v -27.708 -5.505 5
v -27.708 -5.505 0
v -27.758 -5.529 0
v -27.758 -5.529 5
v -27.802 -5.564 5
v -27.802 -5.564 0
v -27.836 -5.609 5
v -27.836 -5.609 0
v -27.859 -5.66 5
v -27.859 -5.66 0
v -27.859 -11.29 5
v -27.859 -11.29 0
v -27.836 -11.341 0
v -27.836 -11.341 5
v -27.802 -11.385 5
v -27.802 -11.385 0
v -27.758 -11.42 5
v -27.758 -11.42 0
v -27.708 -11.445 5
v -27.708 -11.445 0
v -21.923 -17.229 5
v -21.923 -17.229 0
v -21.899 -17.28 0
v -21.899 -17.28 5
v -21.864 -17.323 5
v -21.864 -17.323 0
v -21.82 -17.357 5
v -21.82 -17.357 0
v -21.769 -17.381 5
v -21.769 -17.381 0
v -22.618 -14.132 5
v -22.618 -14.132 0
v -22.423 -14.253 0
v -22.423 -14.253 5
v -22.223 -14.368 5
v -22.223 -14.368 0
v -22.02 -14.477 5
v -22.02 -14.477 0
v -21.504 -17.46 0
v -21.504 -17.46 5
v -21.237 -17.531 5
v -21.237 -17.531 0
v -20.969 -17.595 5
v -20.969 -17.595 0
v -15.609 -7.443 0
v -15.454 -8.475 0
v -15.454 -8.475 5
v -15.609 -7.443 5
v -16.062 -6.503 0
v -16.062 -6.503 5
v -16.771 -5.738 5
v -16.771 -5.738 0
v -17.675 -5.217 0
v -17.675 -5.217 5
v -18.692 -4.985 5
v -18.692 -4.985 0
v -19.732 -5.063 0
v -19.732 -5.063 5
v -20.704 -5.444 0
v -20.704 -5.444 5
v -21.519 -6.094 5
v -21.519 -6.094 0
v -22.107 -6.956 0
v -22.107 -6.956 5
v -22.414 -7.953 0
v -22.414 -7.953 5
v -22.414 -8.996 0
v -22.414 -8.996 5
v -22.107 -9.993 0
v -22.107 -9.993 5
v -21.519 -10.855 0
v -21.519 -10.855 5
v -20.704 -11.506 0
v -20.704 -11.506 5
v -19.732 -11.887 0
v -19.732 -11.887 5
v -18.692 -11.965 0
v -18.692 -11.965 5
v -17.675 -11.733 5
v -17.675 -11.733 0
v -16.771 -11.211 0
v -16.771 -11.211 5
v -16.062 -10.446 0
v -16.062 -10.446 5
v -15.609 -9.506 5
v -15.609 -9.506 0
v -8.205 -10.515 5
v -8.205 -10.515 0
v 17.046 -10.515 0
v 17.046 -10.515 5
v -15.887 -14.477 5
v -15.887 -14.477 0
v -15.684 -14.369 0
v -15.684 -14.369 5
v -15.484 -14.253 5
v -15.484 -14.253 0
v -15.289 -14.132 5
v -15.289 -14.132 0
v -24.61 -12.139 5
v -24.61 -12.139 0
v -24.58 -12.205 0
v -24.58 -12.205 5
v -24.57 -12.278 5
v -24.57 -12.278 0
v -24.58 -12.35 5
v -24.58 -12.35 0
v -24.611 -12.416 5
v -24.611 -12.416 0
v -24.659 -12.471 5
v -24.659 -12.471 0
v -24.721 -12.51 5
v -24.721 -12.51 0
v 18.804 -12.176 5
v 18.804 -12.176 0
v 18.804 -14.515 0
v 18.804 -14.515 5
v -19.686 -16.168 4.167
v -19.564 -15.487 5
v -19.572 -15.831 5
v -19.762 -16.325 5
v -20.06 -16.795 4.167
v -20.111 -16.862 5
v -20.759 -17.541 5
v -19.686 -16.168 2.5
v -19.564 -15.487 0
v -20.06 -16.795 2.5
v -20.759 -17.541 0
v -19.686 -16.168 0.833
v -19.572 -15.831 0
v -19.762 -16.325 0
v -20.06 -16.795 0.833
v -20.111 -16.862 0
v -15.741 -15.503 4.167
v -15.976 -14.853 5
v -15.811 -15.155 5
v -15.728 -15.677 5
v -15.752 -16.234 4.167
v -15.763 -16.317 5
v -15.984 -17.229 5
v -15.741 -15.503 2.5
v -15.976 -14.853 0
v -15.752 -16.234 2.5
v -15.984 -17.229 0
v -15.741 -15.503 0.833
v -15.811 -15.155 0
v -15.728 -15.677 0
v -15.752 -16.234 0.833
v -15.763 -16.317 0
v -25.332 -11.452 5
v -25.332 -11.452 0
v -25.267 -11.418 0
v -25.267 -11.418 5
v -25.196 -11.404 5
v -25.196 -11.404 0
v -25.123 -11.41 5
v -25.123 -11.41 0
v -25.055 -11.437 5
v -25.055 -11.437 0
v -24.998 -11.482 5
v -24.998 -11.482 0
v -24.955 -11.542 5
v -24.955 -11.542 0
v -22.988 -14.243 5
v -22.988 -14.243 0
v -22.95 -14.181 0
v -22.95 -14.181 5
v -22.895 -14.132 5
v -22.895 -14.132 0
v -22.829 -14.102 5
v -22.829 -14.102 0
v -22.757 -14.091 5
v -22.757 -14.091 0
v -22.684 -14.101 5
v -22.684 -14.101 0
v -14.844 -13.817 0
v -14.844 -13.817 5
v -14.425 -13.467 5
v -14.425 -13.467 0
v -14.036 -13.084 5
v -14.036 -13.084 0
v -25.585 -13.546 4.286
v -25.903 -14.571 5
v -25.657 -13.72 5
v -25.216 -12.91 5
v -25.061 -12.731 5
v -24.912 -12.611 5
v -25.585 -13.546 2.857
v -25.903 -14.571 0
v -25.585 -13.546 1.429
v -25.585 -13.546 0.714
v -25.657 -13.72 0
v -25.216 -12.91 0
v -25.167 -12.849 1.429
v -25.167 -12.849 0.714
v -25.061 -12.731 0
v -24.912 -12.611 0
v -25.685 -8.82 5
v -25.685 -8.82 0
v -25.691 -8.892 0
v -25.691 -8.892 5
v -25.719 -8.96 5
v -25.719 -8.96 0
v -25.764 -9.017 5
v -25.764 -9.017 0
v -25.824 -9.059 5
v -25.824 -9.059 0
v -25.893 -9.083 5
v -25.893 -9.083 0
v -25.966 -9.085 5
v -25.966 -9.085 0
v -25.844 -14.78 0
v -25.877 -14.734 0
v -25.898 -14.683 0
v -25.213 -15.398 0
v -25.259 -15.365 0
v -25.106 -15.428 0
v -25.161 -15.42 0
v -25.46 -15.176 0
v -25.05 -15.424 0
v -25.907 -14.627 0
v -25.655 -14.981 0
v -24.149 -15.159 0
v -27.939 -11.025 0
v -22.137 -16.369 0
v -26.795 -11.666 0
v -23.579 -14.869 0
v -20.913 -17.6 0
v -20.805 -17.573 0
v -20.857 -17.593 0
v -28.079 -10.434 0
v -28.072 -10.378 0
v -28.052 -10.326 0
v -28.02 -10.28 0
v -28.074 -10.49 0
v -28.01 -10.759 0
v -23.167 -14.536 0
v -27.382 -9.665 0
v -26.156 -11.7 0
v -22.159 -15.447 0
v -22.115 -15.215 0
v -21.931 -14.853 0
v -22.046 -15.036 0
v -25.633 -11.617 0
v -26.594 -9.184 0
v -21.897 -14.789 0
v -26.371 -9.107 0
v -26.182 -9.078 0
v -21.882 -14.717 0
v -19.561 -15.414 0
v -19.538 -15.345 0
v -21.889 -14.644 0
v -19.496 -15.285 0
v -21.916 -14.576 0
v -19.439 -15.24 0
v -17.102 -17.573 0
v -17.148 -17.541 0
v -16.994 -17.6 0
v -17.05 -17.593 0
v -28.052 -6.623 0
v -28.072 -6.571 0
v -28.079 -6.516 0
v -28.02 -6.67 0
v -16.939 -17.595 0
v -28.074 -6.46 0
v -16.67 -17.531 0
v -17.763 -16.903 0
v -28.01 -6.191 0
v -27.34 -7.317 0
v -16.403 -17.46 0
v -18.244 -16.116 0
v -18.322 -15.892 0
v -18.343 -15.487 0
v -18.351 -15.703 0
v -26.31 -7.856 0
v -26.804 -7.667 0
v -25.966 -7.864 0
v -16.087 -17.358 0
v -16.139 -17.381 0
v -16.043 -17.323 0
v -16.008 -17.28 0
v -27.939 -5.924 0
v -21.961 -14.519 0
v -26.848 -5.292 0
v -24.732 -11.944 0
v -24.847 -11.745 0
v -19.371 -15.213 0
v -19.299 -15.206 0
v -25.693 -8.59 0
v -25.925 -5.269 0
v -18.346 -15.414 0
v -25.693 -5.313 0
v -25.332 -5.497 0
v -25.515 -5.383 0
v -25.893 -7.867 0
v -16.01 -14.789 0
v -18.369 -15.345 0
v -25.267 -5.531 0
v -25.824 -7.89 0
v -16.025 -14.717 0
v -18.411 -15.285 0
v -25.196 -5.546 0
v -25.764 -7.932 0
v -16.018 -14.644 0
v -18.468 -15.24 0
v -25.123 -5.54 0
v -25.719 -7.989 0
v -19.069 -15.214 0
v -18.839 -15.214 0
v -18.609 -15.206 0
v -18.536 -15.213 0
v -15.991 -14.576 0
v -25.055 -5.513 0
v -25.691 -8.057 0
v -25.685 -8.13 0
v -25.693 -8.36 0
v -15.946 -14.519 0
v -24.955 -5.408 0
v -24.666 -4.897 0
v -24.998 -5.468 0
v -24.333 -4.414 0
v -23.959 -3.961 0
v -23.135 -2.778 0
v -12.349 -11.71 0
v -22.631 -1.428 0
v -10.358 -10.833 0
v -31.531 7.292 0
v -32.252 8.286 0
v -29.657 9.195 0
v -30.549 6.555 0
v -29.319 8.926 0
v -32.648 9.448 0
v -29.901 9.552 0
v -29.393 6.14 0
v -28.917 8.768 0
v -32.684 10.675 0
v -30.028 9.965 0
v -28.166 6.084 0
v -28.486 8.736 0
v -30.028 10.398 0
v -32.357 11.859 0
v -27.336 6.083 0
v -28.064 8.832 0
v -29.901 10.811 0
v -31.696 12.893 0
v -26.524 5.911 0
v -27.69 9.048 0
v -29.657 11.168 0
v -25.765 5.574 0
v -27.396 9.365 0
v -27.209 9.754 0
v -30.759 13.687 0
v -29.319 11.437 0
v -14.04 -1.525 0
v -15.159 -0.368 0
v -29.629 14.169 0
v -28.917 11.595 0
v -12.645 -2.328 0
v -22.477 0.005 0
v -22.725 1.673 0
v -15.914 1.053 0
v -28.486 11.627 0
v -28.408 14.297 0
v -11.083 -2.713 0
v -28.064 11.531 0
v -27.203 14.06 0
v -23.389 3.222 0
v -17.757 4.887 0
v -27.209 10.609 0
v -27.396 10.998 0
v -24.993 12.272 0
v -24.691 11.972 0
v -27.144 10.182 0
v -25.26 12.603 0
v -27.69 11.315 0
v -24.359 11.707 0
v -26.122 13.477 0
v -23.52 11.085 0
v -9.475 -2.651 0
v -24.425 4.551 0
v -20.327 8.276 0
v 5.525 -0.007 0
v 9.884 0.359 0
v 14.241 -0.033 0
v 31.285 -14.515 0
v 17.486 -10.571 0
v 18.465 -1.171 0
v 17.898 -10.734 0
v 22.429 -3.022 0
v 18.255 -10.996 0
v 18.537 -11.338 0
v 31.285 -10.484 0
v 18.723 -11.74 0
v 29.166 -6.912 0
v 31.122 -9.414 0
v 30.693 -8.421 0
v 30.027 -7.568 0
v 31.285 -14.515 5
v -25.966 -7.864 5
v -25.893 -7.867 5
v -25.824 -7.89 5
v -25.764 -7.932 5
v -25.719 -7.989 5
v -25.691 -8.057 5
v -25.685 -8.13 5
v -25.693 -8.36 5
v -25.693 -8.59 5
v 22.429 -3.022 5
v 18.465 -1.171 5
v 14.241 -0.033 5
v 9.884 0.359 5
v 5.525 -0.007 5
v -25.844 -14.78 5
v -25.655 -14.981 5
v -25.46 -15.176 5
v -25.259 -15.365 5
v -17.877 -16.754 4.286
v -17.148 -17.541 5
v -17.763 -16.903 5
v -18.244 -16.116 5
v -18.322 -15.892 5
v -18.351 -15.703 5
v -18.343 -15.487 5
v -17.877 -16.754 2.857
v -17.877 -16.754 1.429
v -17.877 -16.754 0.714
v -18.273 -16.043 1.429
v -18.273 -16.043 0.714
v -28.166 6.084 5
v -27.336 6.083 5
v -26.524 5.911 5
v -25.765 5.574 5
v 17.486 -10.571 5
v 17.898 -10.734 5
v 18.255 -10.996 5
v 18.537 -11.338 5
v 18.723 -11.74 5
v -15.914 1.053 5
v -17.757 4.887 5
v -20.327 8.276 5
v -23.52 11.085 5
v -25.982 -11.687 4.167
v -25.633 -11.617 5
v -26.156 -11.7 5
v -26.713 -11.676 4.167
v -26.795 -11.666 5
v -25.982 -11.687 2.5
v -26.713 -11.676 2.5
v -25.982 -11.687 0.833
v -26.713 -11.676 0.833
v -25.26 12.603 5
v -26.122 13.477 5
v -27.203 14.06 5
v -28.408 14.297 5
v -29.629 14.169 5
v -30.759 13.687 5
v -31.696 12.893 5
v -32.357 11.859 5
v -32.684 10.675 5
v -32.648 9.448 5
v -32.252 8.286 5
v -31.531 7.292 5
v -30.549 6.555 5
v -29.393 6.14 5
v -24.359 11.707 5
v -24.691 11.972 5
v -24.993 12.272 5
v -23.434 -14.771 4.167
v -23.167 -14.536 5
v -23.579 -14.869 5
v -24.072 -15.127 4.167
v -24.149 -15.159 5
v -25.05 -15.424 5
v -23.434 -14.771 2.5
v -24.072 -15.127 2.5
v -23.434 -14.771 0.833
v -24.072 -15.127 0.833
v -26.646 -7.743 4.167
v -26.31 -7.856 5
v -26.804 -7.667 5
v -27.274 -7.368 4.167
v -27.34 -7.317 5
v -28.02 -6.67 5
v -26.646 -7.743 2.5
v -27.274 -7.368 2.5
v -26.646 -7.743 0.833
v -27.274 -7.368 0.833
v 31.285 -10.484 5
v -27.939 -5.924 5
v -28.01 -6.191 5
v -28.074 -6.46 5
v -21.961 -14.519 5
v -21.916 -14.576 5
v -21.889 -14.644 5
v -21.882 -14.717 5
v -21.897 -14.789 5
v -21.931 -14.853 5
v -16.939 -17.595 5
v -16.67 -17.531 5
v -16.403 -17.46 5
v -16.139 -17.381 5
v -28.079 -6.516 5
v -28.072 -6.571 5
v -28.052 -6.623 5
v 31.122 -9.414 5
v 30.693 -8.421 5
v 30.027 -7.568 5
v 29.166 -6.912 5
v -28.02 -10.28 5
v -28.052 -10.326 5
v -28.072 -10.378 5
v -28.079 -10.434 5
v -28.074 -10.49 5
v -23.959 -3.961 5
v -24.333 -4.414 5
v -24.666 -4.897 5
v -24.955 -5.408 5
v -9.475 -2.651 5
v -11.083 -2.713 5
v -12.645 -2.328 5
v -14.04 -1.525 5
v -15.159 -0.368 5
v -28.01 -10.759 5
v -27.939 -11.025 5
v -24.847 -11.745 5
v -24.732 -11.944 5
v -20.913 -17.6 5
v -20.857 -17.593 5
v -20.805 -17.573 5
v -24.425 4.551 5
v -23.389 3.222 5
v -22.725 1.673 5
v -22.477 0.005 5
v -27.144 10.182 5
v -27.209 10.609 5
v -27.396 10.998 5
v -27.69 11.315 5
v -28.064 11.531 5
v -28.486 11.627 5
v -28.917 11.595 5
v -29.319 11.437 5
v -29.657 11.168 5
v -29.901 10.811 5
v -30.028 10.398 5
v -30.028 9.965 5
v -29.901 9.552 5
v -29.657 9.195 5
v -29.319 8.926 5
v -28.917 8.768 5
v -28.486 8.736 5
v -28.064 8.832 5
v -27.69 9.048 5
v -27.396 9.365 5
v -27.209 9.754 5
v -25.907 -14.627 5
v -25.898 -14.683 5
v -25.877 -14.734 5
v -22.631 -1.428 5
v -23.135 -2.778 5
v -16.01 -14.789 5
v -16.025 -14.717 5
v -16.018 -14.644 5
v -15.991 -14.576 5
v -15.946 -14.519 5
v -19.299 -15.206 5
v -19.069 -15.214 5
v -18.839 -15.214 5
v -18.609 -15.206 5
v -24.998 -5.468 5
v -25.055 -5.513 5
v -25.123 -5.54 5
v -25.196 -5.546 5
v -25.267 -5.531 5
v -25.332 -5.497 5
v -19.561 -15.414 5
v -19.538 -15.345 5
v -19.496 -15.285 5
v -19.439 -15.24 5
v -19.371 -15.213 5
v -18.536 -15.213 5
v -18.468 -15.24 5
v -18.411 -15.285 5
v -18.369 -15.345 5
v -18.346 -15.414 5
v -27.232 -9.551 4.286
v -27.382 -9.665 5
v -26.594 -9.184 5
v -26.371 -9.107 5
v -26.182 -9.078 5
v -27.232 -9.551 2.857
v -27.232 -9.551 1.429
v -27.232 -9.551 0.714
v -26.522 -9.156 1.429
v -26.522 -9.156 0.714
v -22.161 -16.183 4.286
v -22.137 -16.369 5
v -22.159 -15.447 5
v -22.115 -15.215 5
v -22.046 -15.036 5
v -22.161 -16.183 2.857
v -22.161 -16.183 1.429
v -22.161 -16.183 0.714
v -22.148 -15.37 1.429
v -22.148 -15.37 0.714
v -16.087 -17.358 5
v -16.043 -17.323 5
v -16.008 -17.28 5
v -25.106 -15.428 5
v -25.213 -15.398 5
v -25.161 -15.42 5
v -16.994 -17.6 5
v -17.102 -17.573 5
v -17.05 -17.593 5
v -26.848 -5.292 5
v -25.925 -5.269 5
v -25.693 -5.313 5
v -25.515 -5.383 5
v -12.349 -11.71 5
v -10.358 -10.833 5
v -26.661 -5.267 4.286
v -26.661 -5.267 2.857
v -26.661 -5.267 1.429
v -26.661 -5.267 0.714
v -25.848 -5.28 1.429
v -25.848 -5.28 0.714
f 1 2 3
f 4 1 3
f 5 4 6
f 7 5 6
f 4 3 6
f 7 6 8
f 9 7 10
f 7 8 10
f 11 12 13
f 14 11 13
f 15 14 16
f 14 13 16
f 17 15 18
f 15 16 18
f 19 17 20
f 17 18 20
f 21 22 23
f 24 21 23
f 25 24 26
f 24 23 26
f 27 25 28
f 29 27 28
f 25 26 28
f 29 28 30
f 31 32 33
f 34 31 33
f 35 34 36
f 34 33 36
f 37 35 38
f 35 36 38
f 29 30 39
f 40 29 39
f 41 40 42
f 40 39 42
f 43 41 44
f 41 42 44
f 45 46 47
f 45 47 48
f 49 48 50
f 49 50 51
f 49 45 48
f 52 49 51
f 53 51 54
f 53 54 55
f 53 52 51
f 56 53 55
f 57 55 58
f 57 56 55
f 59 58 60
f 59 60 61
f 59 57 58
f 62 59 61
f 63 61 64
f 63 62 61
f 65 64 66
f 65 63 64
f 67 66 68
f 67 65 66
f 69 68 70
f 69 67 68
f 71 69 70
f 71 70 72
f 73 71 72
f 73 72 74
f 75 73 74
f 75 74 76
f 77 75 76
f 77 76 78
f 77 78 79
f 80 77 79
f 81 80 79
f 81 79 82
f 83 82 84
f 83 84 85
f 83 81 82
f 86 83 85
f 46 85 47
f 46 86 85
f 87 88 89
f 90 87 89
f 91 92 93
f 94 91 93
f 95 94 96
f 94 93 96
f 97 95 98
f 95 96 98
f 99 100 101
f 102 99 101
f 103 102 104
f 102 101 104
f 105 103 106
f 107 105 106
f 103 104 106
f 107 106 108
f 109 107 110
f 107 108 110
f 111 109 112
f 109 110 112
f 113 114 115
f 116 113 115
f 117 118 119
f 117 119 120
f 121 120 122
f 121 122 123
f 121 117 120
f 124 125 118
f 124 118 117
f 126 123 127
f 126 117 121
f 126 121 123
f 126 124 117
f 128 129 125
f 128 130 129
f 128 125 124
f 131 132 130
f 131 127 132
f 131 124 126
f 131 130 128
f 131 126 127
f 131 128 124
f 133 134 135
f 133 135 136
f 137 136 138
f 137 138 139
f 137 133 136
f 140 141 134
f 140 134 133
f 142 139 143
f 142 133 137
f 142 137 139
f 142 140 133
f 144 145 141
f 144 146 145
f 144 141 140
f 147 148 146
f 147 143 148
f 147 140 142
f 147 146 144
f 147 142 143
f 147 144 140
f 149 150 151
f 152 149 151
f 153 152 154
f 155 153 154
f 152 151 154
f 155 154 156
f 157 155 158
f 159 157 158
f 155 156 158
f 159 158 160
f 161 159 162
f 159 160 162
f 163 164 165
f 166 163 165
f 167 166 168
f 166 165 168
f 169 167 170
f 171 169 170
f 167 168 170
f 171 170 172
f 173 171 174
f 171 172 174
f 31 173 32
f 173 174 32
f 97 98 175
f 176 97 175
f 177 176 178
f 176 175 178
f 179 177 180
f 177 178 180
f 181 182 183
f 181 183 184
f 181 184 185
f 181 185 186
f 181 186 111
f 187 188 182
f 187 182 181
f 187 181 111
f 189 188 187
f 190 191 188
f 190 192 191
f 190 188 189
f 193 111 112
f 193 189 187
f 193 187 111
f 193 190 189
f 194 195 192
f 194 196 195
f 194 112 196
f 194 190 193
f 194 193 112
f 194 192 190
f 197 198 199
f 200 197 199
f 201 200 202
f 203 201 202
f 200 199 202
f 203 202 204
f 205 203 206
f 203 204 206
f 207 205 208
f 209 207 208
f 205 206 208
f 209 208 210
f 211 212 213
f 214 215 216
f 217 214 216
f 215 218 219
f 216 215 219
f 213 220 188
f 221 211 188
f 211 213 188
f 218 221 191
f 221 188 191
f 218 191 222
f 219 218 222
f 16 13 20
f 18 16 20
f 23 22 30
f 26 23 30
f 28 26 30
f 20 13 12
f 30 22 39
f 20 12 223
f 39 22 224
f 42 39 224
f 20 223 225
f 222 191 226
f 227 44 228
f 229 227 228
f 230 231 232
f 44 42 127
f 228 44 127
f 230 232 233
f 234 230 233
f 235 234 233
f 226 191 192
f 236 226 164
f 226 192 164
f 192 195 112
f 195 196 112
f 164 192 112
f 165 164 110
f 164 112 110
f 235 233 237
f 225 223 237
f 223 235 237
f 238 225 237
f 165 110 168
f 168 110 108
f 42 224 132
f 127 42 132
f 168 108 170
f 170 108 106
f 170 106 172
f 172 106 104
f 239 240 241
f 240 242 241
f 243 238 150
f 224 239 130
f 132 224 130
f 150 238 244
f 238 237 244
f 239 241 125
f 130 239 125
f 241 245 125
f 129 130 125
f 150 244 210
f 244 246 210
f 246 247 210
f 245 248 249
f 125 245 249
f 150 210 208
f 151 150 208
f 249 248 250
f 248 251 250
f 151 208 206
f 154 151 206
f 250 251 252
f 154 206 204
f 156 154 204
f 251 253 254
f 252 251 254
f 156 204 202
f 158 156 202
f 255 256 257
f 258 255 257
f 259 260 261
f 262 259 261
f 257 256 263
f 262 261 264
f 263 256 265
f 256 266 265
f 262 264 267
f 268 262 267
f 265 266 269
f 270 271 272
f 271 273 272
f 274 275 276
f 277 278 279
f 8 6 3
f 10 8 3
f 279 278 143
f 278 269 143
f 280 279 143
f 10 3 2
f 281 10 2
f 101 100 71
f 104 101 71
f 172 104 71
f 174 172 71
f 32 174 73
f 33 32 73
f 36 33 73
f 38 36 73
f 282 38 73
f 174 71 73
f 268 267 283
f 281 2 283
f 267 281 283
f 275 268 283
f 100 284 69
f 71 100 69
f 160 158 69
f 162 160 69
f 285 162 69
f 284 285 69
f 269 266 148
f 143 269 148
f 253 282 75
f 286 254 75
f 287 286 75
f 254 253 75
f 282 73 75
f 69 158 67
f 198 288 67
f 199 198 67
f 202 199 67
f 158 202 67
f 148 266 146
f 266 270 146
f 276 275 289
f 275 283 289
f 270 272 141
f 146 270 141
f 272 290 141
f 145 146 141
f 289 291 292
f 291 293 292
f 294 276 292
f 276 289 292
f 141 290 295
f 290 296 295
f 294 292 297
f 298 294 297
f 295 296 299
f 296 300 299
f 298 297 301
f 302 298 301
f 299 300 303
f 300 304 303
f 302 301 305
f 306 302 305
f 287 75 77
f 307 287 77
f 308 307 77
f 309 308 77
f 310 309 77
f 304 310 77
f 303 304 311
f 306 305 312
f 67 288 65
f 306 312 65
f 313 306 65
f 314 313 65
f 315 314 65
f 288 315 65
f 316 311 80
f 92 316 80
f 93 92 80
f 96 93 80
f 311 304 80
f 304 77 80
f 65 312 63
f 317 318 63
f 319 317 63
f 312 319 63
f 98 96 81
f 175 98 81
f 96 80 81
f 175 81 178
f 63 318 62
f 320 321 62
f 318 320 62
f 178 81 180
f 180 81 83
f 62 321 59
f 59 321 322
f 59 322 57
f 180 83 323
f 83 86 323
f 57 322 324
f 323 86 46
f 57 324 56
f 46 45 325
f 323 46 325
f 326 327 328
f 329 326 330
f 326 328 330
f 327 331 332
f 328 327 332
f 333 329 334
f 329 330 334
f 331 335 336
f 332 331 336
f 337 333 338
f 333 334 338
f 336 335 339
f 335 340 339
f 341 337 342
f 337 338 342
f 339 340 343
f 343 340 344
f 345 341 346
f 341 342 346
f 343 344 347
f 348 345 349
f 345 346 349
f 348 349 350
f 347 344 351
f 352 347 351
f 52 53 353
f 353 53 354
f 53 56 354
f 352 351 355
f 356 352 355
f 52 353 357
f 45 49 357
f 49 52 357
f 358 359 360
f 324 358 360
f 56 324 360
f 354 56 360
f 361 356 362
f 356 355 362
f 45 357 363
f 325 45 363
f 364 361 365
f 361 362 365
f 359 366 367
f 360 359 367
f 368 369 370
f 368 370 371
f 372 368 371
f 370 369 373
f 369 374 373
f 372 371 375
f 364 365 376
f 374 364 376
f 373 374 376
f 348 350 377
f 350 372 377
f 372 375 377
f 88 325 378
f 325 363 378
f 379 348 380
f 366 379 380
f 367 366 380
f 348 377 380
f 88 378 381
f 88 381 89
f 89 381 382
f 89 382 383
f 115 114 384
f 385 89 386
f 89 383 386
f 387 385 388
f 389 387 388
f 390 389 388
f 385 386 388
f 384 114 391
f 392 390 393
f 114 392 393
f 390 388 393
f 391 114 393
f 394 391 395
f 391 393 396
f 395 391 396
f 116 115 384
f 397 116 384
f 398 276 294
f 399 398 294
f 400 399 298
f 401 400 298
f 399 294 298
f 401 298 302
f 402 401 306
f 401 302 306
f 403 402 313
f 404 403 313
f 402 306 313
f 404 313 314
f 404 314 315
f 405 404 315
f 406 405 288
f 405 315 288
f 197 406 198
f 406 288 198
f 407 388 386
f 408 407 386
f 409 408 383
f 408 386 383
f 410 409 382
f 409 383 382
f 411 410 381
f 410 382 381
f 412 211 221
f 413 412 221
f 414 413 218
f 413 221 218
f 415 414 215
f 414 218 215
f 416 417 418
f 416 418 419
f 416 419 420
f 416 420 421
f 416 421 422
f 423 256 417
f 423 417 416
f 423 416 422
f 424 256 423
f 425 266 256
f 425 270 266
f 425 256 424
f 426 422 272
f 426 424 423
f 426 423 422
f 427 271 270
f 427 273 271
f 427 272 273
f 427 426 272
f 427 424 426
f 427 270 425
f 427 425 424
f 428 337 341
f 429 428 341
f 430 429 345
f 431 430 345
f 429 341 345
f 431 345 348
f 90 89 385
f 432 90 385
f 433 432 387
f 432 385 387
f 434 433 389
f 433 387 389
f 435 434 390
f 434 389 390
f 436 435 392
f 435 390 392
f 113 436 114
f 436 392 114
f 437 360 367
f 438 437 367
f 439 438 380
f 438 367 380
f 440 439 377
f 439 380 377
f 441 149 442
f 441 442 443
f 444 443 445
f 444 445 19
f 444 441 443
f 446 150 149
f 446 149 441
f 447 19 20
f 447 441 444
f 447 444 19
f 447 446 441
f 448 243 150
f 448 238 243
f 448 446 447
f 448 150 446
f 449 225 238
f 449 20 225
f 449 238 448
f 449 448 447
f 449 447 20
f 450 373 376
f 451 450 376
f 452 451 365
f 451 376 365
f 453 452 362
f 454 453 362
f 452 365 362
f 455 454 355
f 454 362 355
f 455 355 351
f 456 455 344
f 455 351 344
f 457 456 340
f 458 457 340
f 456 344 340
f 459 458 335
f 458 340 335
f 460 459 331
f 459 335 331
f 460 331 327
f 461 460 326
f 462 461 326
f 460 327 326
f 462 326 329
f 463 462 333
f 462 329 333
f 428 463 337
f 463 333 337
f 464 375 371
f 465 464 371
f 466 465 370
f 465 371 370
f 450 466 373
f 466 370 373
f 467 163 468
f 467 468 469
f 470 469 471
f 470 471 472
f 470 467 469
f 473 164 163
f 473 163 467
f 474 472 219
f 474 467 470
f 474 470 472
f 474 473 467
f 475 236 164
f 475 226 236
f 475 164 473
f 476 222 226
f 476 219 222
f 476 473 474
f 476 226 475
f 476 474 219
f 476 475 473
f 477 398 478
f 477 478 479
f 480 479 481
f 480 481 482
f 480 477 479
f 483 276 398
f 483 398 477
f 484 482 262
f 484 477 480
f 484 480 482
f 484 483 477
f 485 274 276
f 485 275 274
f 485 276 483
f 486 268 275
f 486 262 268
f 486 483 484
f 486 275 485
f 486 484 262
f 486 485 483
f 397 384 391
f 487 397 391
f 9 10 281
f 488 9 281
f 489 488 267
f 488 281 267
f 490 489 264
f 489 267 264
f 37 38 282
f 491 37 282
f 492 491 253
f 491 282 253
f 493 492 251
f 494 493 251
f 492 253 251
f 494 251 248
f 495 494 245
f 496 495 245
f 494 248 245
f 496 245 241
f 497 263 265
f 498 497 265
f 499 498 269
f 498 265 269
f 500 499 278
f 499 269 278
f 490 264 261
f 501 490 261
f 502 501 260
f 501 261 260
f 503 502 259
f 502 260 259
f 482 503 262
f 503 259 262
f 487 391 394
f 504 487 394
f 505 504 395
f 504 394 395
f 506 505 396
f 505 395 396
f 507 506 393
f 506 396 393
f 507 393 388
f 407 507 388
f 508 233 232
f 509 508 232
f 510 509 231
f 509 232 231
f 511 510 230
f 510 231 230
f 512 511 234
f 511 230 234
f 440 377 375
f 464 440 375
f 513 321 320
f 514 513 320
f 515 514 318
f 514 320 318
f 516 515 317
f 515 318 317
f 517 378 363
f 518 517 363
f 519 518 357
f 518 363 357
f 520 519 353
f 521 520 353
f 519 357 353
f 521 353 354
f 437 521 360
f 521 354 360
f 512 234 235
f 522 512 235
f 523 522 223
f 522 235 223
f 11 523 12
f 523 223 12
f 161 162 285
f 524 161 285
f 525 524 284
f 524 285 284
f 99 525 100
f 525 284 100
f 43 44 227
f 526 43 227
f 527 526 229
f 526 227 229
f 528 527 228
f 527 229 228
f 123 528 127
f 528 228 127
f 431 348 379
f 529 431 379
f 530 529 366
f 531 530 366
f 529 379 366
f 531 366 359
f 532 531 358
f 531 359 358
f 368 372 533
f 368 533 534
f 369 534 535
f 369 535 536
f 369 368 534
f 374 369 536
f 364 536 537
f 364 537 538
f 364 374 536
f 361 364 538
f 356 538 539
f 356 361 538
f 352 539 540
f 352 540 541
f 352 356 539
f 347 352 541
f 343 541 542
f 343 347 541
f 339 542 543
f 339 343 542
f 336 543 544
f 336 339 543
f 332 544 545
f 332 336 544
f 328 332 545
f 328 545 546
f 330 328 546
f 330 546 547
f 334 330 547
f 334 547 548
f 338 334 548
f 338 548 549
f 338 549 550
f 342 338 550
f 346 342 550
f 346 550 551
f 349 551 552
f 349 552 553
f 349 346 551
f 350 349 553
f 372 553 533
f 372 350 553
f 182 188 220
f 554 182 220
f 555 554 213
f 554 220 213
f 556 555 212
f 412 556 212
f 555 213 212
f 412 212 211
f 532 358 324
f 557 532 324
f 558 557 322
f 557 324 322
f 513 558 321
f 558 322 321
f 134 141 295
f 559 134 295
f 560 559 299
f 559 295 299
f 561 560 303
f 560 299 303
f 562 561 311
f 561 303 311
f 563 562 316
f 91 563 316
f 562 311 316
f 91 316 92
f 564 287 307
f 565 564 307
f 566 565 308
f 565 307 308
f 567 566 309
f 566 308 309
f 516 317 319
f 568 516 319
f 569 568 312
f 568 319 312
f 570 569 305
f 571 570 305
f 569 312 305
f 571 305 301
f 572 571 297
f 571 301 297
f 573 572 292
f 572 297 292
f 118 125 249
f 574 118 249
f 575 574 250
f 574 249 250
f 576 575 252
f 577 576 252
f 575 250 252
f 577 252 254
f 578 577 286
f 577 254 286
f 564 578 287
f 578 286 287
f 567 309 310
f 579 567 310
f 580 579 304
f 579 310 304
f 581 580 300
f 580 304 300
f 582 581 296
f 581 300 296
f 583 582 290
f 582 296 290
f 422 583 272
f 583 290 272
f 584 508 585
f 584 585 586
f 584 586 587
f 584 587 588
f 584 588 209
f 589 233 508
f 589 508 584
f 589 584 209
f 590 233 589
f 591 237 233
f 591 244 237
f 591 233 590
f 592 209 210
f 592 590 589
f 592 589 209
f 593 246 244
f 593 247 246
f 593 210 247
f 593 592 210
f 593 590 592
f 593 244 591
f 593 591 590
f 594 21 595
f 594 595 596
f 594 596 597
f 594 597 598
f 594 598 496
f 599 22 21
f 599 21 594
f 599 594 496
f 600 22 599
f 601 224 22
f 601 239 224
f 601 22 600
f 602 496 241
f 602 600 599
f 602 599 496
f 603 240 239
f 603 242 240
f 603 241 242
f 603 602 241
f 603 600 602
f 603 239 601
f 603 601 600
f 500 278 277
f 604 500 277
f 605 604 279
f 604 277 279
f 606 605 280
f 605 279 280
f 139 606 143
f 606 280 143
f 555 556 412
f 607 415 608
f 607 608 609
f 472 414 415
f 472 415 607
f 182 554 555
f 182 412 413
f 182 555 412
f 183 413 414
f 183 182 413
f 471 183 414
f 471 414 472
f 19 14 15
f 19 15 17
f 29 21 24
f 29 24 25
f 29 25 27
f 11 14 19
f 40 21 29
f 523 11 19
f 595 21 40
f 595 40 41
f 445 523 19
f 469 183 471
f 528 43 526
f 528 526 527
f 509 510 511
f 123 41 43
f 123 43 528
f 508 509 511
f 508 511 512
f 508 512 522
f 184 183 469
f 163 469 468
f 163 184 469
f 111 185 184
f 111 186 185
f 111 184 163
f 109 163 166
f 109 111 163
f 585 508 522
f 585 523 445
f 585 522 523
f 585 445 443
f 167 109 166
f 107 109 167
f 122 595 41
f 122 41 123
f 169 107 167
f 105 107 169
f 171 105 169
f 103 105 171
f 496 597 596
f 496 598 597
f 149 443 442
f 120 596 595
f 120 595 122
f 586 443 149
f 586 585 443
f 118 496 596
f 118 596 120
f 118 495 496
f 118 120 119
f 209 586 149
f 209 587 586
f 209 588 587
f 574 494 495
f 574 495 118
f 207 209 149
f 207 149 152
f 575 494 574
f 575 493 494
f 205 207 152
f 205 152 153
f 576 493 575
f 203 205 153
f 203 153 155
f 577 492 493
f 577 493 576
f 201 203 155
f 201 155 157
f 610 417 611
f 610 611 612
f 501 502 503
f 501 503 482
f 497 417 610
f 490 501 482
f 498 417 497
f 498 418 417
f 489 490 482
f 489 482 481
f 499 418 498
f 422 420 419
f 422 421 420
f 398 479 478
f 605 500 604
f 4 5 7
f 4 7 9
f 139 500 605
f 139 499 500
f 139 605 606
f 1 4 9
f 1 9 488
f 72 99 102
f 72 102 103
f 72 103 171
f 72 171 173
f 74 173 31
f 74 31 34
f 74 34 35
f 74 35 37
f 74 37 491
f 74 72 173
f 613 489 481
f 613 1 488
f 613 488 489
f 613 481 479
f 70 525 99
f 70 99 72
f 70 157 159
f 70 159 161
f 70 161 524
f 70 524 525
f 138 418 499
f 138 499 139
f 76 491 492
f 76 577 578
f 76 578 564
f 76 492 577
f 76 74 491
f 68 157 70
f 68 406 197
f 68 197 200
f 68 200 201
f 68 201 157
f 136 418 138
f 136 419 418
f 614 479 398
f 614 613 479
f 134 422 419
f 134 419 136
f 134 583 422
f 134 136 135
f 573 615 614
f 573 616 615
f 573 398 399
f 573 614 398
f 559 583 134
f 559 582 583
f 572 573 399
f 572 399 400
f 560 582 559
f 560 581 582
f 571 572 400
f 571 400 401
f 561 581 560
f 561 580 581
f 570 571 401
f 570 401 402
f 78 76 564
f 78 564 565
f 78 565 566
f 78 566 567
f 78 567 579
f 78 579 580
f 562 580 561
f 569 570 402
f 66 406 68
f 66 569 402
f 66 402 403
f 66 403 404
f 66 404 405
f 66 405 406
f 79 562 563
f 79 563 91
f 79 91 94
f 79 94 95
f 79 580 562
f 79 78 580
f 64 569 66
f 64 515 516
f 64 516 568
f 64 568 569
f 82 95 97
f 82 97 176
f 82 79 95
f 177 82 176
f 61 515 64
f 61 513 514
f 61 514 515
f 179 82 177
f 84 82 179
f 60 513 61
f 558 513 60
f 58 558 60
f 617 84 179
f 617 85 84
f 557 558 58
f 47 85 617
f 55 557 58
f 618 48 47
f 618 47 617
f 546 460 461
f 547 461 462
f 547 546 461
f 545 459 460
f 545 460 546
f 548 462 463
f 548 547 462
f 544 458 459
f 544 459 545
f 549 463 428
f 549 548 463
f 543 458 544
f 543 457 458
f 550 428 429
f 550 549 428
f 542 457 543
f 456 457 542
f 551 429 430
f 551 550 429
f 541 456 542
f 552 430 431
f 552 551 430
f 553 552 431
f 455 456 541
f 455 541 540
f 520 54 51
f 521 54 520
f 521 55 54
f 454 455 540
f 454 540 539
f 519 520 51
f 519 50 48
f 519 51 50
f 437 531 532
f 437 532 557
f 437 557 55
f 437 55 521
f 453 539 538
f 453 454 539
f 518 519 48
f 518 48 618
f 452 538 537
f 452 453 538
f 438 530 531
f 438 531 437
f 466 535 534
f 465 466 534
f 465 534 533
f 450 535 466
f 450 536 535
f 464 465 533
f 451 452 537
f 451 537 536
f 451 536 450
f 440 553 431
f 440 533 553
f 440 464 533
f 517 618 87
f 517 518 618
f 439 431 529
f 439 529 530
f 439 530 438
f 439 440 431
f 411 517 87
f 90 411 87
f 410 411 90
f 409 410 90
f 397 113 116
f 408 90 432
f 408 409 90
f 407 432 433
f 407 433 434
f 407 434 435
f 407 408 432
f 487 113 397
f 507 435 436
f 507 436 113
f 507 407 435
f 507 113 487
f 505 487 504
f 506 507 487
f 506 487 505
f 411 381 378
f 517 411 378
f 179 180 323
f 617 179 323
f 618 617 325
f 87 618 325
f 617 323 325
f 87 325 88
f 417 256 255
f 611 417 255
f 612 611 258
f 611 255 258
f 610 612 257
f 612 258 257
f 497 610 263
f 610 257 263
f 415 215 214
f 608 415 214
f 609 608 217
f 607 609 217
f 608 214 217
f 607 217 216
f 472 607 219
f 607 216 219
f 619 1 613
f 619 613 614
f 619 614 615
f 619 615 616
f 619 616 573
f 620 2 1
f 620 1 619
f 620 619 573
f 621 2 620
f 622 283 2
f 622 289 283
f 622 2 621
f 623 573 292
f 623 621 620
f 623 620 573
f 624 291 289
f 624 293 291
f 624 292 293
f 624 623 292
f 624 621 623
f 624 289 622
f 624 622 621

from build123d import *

# Parameters (mm, degrees)
ESQUISSE1_R        = 3.5
ESQUISSE1_R_2      = 1.45
BOSS_EXTRU_1_DEPTH = 5


with BuildPart() as part:
    # Esquisse1 → Boss.-Extru.1 (new body)
    with BuildSketch(Plane.XY):
        with BuildLine():
            Line((-23.520309347, 11.085383373), (-24.358908183, 11.706502475))
            ThreePointArc((-24.358908183, 11.706502475), (-24.845678879, 12.118284674), (-25.260449538, 12.602511471))
            ThreePointArc((-25.260449538, 12.602511471), (-32.357200459, 11.85890316), (-28.166092976, 6.083832163))
            ThreePointArc((-28.166092976, 6.083832163), (-26.925251175, 6.018420638), (-25.765053202, 5.573552451))
            ThreePointArc((-25.765053202, 5.573552451), (-23.38866031, 3.221956107), (-22.477205459, 0.005358743))
            ThreePointArc((-22.477205459, 0.005358743), (-22.840333933, -2.118823087), (-23.958742219, -3.960879992))
            ThreePointArc((-23.958742219, -3.960879992), (-24.504417424, -4.651802838), (-24.955377519, -5.407958113))
            ThreePointArc((-24.955377519, -5.407958113), (-25.122929262, -5.539522919), (-25.331723523, -5.497240048))
            add(Edge.make_bspline(
                [(-27.707778762, -5.50497209), (-27.463755153, -5.421858651), (-27.208964141, -5.35321212), (-26.847281922, -5.290646334), (-26.755999287, -5.277514723), (-26.472348923, -5.247412771), (-26.276940328, -5.237520804), (-25.988433148, -5.260972525), (-25.921846007, -5.267964485), (-25.794475247, -5.289589568), (-25.737903956, -5.299827616), (-25.600175401, -5.340785914), (-25.51525962, -5.375688947), (-25.386655187, -5.458237644), (-25.359770306, -5.476681289), (-25.331723523, -5.497240048)],
                knots=[0, 0, 0, 0, 0.401379624, 0.401379624, 0.532597126, 0.532597126, 0.795032129, 0.795032129, 0.872293172, 0.872293172, 0.929035383, 0.929035383, 0.985777595, 0.985777595, 1, 1, 1, 1], degree=3))
            ThreePointArc((-27.707778762, -5.50497209), (-27.801973044, -5.564338041), (-27.859240924, -5.659822431))
            ThreePointArc((-27.859240924, -5.659822431), (-27.97528469, -6.057416591), (-28.073587363, -6.459764521))
            ThreePointArc((-28.073587363, -6.459764521), (-28.071734795, -6.57109038), (-28.019843727, -6.669600257))
            add(Edge.make_bspline(
                [(-25.965992802, -7.864336487), (-26.163909603, -7.885982848), (-26.294618647, -7.863685821), (-26.490123672, -7.810689646), (-26.569333075, -7.776803309), (-26.723621302, -7.70842793), (-26.794279204, -7.672573545), (-27.014611477, -7.551431096), (-27.148381506, -7.461400071), (-27.399282552, -7.274477346), (-27.514428456, -7.1774816), (-27.765918403, -6.946352168), (-27.896967937, -6.810004535), (-28.019843727, -6.669600257)],
                knots=[0, 0, 0, 0, 0.081187854, 0.081187854, 0.177126147, 0.177126147, 0.27306444, 0.27306444, 0.491378598, 0.491378598, 0.709692757, 0.709692757, 1, 1, 1, 1], degree=3))
            ThreePointArc((-25.965992802, -7.864336487), (-25.764030643, -7.932116803), (-25.68471018, -8.12983162))
            ThreePointArc((-25.68471018, -8.12983162), (-25.693544809, -8.474793397), (-25.684712274, -8.819755228))
            ThreePointArc((-25.684712274, -8.819755228), (-25.764033937, -9.017469563), (-25.965996507, -9.085248653))
            add(Edge.make_bspline(
                [(-28.019854683, -10.279972417), (-27.850080758, -10.085982263), (-27.663748533, -9.899137116), (-27.381805435, -9.664112445), (-27.309318159, -9.607098819), (-27.078720715, -9.439204582), (-26.914437891, -9.332933591), (-26.652857483, -9.208989788), (-26.591695348, -9.181751432), (-26.470576489, -9.136793922), (-26.416465288, -9.117374686), (-26.2767097, -9.083981334), (-26.185718951, -9.071750358), (-26.033069896, -9.078937415), (-26.000565097, -9.081467639), (-25.965996507, -9.085248653)],
                knots=[0, 0, 0, 0, 0.401379627, 0.401379627, 0.532597128, 0.532597128, 0.79503213, 0.79503213, 0.872293173, 0.872293173, 0.929035387, 0.929035387, 0.985777601, 0.985777601, 1, 1, 1, 1], degree=3))
            ThreePointArc((-28.019854683, -10.279972417), (-28.071746349, -10.37848198), (-28.073599593, -10.489807828))
            ThreePointArc((-28.073599593, -10.489807828), (-27.975299362, -10.892156354), (-27.85925801, -11.289751218))
            ThreePointArc((-27.85925801, -11.289751218), (-27.801990645, -11.385236021), (-27.707796615, -11.444602537))
            add(Edge.make_bspline(
                [(-25.331741596, -11.452348942), (-25.492319392, -11.570053641), (-25.616665259, -11.616098371), (-25.812475663, -11.66795485), (-25.898016186, -11.678213122), (-26.065821398, -11.696142421), (-26.144940129, -11.700420563), (-26.396324695, -11.705674262), (-26.557188449, -11.694590122), (-26.867936486, -11.658160819), (-27.016153634, -11.631732992), (-27.349515039, -11.557314005), (-27.531181086, -11.504758257), (-27.707796615, -11.444602537)],
                knots=[0, 0, 0, 0, 0.081187854, 0.081187854, 0.177126146, 0.177126146, 0.273064438, 0.273064438, 0.491378592, 0.491378592, 0.709692747, 0.709692747, 1, 1, 1, 1], degree=3))
            ThreePointArc((-25.331741596, -11.452348942), (-25.122947078, -11.410067338), (-24.955396133, -11.541633161))
            ThreePointArc((-24.955396133, -11.541633161), (-24.790566257, -11.844796137), (-24.610436143, -12.139125579))
            ThreePointArc((-24.610436143, -12.139125579), (-24.58027355, -12.350012048), (-24.721288721, -12.509691746))
            add(Edge.make_bspline(
                [(-25.902620196, -14.571281964), (-25.852586741, -14.318394602), (-25.784640874, -14.063415847), (-25.657983326, -13.718906965), (-25.623714317, -13.633288078), (-25.50795819, -13.372588681), (-25.418820586, -13.19841389), (-25.254257211, -12.960285204), (-25.214908427, -12.906115029), (-25.132495175, -12.806621255), (-25.095343118, -12.762748102), (-24.991007907, -12.663950818), (-24.918323098, -12.607863109), (-24.78253161, -12.537762753), (-24.753116511, -12.52370159), (-24.721288721, -12.509691746)],
                knots=[0, 0, 0, 0, 0.401379624, 0.401379624, 0.532597126, 0.532597126, 0.795032129, 0.795032129, 0.872293171, 0.872293171, 0.929035385, 0.929035385, 0.985777599, 0.985777599, 1, 1, 1, 1], degree=3))
            ThreePointArc((-25.902620196, -14.571281964), (-25.898304915, -14.682539581), (-25.844246948, -14.779877216))
            ThreePointArc((-25.844246948, -14.779877216), (-25.557942188, -15.079171145), (-25.258649996, -15.365477722))
            ThreePointArc((-25.258649996, -15.365477722), (-25.16131269, -15.41953628), (-25.0500551, -15.423852235))
            add(Edge.make_bspline(
                [(-22.988457711, -14.242533274), (-23.068669813, -14.424757432), (-23.153334128, -14.526806272), (-23.296982674, -14.669620503), (-23.365933805, -14.72127469), (-23.502292735, -14.820704525), (-23.568672495, -14.863968871), (-23.783751076, -14.994210996), (-23.928605252, -15.065043729), (-24.215935615, -15.188869049), (-24.357509352, -15.240090455), (-24.683418279, -15.342322416), (-24.867023546, -15.387640821), (-25.0500551, -15.423852235)],
                knots=[0, 0, 0, 0, 0.081187854, 0.081187854, 0.177126148, 0.177126148, 0.273064442, 0.273064442, 0.49137861, 0.49137861, 0.709692777, 0.709692777, 1, 1, 1, 1], degree=3))
            ThreePointArc((-22.988457711, -14.242533274), (-22.828777157, -14.101519072), (-22.617890871, -14.131682944))
            ThreePointArc((-22.617890871, -14.131682944), (-22.323562523, -14.311814845), (-22.020400547, -14.476646561))
            ThreePointArc((-22.020400547, -14.476646561), (-21.88883574, -14.644198304), (-21.931118612, -14.852992566))
            add(Edge.make_bspline(
                [(-21.92338657, -17.229047804), (-22.006500009, -16.985024196), (-22.075146539, -16.730233184), (-22.137712326, -16.368550965), (-22.150843937, -16.27726833), (-22.180945889, -15.993617965), (-22.190837855, -15.798209371), (-22.167386135, -15.509702191), (-22.160394175, -15.44311505), (-22.138769092, -15.315744289), (-22.128531044, -15.259172998), (-22.087572745, -15.121444441), (-22.052669711, -15.036528659), (-21.970121013, -14.907924226), (-21.951677369, -14.881039346), (-21.931118612, -14.852992566)],
                knots=[0, 0, 0, 0, 0.401379624, 0.401379624, 0.532597126, 0.532597126, 0.795032129, 0.795032129, 0.872293171, 0.872293171, 0.929035384, 0.929035384, 0.985777596, 0.985777596, 1, 1, 1, 1], degree=3))
            ThreePointArc((-21.92338657, -17.229047804), (-21.864020619, -17.323242086), (-21.768536229, -17.380509967))
            ThreePointArc((-21.768536229, -17.380509967), (-21.370942069, -17.496553733), (-20.96859414, -17.594856406))
            ThreePointArc((-20.96859414, -17.594856406), (-20.85726828, -17.593003837), (-20.758758403, -17.541112769))
            add(Edge.make_bspline(
                [(-19.564022173, -15.487261844), (-19.542375812, -15.685178645), (-19.564672839, -15.815887691), (-19.617669014, -16.011392715), (-19.651555352, -16.090602119), (-19.719930731, -16.244890347), (-19.755785117, -16.31554825), (-19.87692757, -16.535880531), (-19.9669586, -16.669650565), (-20.153881335, -16.920551621), (-20.250877086, -17.035697529), (-20.482006514, -17.287187467), (-20.618354136, -17.418236989), (-20.758758403, -17.541112769)],
                knots=[0, 0, 0, 0, 0.081187854, 0.081187854, 0.177126148, 0.177126148, 0.273064442, 0.273064442, 0.491378611, 0.491378611, 0.70969278, 0.70969278, 1, 1, 1, 1], degree=3))
            ThreePointArc((-19.564022173, -15.487261844), (-19.496241857, -15.285299686), (-19.29852704, -15.205979223))
            ThreePointArc((-19.29852704, -15.205979223), (-18.953565263, -15.214813851), (-18.608603432, -15.205981317))
            ThreePointArc((-18.608603432, -15.205981317), (-18.410889097, -15.285302979), (-18.343110007, -15.48726555))
            add(Edge.make_bspline(
                [(-17.148386243, -17.541123726), (-17.342376397, -17.3713498), (-17.529221544, -17.185017576), (-17.764246214, -16.903074479), (-17.82125984, -16.830587203), (-17.989154077, -16.599989758), (-18.095425068, -16.435706934), (-18.219368872, -16.174126527), (-18.246607228, -16.112964392), (-18.291564738, -15.991845532), (-18.310983975, -15.93773433), (-18.344377327, -15.797978738), (-18.356608302, -15.706987985), (-18.349421244, -15.554338929), (-18.34689102, -15.521834135), (-18.343110007, -15.48726555)],
                knots=[0, 0, 0, 0, 0.401379626, 0.401379626, 0.532597128, 0.532597128, 0.79503213, 0.79503213, 0.872293172, 0.872293172, 0.929035388, 0.929035388, 0.985777604, 0.985777604, 1, 1, 1, 1], degree=3))
            ThreePointArc((-17.148386243, -17.541123726), (-17.04987668, -17.593015392), (-16.938550832, -17.594868636))
            ThreePointArc((-16.938550832, -17.594868636), (-16.536202306, -17.496568405), (-16.138607442, -17.380527052))
            ThreePointArc((-16.138607442, -17.380527052), (-16.043122704, -17.323259752), (-15.983756182, -17.22906583))
            add(Edge.make_bspline(
                [(-15.976009718, -14.853010638), (-15.858305019, -15.013588435), (-15.812260288, -15.137934302), (-15.76040381, -15.333744708), (-15.750145537, -15.419285233), (-15.732216239, -15.587090447), (-15.727938096, -15.666209179), (-15.722684398, -15.917593753), (-15.733768539, -16.078457512), (-15.770197846, -16.38920556), (-15.796625675, -16.537422713), (-15.871044662, -16.870784108), (-15.923600407, -17.052450142), (-15.983756182, -17.22906583)],
                knots=[0, 0, 0, 0, 0.081187854, 0.081187854, 0.177126148, 0.177126148, 0.273064442, 0.273064442, 0.491378605, 0.491378605, 0.709692768, 0.709692768, 1, 1, 1, 1], degree=3))
            ThreePointArc((-15.976009718, -14.853010638), (-16.018291322, -14.64421612), (-15.886725499, -14.476665176))
            ThreePointArc((-15.886725499, -14.476665176), (-15.583562523, -14.3118353), (-15.289233081, -14.131705185))
            ThreePointArc((-15.289233081, -14.131705185), (-14.630974378, -13.646175845), (-14.036377119, -13.084484329))
            ThreePointArc((-14.036377119, -13.084484329), (-11.382823106, -11.204809867), (-8.204887511, -10.515425843))
            Line((-8.204887511, -10.515425843), (17.04643759, -10.514813851))
            ThreePointArc((17.04643759, -10.514813851), (18.255496355, -10.99583891), (18.803660163, -12.175976463))
            Line((18.803660163, -12.175976463), (18.803660163, -14.514813851))
            Line((18.803660163, -14.514813851), (31.285246412, -14.514813851))
            Line((31.285246412, -14.514813851), (31.285258645, -10.483748772))
            ThreePointArc((31.285258645, -10.483748772), (30.693026835, -8.420856178), (29.166459934, -6.912261511))
            Line((29.166459934, -6.912261511), (22.428792847, -3.022240342))
            ThreePointArc((22.428792847, -3.022240342), (14.240952746, -0.032887143), (5.524515127, -0.006939391))
            Line((5.524515127, -0.006939391), (-9.47465467, -2.651398118))
            ThreePointArc((-9.47465467, -2.651398118), (-13.371139001, -1.975728488), (-15.913565792, 1.053328395))
            ThreePointArc((-15.913565792, 1.053328395), (-18.956552603, 6.645913075), (-23.520309347, 11.085383373))
        make_face()
        with Locations((-18.953544809, -8.474813851)):
            Circle(ESQUISSE1_R, mode=Mode.SUBTRACT)
        with Locations((-28.594110039, 10.181539009)):
            Circle(ESQUISSE1_R_2, mode=Mode.SUBTRACT)
    extrude(amount=BOSS_EXTRU_1_DEPTH)


solid = part.part
